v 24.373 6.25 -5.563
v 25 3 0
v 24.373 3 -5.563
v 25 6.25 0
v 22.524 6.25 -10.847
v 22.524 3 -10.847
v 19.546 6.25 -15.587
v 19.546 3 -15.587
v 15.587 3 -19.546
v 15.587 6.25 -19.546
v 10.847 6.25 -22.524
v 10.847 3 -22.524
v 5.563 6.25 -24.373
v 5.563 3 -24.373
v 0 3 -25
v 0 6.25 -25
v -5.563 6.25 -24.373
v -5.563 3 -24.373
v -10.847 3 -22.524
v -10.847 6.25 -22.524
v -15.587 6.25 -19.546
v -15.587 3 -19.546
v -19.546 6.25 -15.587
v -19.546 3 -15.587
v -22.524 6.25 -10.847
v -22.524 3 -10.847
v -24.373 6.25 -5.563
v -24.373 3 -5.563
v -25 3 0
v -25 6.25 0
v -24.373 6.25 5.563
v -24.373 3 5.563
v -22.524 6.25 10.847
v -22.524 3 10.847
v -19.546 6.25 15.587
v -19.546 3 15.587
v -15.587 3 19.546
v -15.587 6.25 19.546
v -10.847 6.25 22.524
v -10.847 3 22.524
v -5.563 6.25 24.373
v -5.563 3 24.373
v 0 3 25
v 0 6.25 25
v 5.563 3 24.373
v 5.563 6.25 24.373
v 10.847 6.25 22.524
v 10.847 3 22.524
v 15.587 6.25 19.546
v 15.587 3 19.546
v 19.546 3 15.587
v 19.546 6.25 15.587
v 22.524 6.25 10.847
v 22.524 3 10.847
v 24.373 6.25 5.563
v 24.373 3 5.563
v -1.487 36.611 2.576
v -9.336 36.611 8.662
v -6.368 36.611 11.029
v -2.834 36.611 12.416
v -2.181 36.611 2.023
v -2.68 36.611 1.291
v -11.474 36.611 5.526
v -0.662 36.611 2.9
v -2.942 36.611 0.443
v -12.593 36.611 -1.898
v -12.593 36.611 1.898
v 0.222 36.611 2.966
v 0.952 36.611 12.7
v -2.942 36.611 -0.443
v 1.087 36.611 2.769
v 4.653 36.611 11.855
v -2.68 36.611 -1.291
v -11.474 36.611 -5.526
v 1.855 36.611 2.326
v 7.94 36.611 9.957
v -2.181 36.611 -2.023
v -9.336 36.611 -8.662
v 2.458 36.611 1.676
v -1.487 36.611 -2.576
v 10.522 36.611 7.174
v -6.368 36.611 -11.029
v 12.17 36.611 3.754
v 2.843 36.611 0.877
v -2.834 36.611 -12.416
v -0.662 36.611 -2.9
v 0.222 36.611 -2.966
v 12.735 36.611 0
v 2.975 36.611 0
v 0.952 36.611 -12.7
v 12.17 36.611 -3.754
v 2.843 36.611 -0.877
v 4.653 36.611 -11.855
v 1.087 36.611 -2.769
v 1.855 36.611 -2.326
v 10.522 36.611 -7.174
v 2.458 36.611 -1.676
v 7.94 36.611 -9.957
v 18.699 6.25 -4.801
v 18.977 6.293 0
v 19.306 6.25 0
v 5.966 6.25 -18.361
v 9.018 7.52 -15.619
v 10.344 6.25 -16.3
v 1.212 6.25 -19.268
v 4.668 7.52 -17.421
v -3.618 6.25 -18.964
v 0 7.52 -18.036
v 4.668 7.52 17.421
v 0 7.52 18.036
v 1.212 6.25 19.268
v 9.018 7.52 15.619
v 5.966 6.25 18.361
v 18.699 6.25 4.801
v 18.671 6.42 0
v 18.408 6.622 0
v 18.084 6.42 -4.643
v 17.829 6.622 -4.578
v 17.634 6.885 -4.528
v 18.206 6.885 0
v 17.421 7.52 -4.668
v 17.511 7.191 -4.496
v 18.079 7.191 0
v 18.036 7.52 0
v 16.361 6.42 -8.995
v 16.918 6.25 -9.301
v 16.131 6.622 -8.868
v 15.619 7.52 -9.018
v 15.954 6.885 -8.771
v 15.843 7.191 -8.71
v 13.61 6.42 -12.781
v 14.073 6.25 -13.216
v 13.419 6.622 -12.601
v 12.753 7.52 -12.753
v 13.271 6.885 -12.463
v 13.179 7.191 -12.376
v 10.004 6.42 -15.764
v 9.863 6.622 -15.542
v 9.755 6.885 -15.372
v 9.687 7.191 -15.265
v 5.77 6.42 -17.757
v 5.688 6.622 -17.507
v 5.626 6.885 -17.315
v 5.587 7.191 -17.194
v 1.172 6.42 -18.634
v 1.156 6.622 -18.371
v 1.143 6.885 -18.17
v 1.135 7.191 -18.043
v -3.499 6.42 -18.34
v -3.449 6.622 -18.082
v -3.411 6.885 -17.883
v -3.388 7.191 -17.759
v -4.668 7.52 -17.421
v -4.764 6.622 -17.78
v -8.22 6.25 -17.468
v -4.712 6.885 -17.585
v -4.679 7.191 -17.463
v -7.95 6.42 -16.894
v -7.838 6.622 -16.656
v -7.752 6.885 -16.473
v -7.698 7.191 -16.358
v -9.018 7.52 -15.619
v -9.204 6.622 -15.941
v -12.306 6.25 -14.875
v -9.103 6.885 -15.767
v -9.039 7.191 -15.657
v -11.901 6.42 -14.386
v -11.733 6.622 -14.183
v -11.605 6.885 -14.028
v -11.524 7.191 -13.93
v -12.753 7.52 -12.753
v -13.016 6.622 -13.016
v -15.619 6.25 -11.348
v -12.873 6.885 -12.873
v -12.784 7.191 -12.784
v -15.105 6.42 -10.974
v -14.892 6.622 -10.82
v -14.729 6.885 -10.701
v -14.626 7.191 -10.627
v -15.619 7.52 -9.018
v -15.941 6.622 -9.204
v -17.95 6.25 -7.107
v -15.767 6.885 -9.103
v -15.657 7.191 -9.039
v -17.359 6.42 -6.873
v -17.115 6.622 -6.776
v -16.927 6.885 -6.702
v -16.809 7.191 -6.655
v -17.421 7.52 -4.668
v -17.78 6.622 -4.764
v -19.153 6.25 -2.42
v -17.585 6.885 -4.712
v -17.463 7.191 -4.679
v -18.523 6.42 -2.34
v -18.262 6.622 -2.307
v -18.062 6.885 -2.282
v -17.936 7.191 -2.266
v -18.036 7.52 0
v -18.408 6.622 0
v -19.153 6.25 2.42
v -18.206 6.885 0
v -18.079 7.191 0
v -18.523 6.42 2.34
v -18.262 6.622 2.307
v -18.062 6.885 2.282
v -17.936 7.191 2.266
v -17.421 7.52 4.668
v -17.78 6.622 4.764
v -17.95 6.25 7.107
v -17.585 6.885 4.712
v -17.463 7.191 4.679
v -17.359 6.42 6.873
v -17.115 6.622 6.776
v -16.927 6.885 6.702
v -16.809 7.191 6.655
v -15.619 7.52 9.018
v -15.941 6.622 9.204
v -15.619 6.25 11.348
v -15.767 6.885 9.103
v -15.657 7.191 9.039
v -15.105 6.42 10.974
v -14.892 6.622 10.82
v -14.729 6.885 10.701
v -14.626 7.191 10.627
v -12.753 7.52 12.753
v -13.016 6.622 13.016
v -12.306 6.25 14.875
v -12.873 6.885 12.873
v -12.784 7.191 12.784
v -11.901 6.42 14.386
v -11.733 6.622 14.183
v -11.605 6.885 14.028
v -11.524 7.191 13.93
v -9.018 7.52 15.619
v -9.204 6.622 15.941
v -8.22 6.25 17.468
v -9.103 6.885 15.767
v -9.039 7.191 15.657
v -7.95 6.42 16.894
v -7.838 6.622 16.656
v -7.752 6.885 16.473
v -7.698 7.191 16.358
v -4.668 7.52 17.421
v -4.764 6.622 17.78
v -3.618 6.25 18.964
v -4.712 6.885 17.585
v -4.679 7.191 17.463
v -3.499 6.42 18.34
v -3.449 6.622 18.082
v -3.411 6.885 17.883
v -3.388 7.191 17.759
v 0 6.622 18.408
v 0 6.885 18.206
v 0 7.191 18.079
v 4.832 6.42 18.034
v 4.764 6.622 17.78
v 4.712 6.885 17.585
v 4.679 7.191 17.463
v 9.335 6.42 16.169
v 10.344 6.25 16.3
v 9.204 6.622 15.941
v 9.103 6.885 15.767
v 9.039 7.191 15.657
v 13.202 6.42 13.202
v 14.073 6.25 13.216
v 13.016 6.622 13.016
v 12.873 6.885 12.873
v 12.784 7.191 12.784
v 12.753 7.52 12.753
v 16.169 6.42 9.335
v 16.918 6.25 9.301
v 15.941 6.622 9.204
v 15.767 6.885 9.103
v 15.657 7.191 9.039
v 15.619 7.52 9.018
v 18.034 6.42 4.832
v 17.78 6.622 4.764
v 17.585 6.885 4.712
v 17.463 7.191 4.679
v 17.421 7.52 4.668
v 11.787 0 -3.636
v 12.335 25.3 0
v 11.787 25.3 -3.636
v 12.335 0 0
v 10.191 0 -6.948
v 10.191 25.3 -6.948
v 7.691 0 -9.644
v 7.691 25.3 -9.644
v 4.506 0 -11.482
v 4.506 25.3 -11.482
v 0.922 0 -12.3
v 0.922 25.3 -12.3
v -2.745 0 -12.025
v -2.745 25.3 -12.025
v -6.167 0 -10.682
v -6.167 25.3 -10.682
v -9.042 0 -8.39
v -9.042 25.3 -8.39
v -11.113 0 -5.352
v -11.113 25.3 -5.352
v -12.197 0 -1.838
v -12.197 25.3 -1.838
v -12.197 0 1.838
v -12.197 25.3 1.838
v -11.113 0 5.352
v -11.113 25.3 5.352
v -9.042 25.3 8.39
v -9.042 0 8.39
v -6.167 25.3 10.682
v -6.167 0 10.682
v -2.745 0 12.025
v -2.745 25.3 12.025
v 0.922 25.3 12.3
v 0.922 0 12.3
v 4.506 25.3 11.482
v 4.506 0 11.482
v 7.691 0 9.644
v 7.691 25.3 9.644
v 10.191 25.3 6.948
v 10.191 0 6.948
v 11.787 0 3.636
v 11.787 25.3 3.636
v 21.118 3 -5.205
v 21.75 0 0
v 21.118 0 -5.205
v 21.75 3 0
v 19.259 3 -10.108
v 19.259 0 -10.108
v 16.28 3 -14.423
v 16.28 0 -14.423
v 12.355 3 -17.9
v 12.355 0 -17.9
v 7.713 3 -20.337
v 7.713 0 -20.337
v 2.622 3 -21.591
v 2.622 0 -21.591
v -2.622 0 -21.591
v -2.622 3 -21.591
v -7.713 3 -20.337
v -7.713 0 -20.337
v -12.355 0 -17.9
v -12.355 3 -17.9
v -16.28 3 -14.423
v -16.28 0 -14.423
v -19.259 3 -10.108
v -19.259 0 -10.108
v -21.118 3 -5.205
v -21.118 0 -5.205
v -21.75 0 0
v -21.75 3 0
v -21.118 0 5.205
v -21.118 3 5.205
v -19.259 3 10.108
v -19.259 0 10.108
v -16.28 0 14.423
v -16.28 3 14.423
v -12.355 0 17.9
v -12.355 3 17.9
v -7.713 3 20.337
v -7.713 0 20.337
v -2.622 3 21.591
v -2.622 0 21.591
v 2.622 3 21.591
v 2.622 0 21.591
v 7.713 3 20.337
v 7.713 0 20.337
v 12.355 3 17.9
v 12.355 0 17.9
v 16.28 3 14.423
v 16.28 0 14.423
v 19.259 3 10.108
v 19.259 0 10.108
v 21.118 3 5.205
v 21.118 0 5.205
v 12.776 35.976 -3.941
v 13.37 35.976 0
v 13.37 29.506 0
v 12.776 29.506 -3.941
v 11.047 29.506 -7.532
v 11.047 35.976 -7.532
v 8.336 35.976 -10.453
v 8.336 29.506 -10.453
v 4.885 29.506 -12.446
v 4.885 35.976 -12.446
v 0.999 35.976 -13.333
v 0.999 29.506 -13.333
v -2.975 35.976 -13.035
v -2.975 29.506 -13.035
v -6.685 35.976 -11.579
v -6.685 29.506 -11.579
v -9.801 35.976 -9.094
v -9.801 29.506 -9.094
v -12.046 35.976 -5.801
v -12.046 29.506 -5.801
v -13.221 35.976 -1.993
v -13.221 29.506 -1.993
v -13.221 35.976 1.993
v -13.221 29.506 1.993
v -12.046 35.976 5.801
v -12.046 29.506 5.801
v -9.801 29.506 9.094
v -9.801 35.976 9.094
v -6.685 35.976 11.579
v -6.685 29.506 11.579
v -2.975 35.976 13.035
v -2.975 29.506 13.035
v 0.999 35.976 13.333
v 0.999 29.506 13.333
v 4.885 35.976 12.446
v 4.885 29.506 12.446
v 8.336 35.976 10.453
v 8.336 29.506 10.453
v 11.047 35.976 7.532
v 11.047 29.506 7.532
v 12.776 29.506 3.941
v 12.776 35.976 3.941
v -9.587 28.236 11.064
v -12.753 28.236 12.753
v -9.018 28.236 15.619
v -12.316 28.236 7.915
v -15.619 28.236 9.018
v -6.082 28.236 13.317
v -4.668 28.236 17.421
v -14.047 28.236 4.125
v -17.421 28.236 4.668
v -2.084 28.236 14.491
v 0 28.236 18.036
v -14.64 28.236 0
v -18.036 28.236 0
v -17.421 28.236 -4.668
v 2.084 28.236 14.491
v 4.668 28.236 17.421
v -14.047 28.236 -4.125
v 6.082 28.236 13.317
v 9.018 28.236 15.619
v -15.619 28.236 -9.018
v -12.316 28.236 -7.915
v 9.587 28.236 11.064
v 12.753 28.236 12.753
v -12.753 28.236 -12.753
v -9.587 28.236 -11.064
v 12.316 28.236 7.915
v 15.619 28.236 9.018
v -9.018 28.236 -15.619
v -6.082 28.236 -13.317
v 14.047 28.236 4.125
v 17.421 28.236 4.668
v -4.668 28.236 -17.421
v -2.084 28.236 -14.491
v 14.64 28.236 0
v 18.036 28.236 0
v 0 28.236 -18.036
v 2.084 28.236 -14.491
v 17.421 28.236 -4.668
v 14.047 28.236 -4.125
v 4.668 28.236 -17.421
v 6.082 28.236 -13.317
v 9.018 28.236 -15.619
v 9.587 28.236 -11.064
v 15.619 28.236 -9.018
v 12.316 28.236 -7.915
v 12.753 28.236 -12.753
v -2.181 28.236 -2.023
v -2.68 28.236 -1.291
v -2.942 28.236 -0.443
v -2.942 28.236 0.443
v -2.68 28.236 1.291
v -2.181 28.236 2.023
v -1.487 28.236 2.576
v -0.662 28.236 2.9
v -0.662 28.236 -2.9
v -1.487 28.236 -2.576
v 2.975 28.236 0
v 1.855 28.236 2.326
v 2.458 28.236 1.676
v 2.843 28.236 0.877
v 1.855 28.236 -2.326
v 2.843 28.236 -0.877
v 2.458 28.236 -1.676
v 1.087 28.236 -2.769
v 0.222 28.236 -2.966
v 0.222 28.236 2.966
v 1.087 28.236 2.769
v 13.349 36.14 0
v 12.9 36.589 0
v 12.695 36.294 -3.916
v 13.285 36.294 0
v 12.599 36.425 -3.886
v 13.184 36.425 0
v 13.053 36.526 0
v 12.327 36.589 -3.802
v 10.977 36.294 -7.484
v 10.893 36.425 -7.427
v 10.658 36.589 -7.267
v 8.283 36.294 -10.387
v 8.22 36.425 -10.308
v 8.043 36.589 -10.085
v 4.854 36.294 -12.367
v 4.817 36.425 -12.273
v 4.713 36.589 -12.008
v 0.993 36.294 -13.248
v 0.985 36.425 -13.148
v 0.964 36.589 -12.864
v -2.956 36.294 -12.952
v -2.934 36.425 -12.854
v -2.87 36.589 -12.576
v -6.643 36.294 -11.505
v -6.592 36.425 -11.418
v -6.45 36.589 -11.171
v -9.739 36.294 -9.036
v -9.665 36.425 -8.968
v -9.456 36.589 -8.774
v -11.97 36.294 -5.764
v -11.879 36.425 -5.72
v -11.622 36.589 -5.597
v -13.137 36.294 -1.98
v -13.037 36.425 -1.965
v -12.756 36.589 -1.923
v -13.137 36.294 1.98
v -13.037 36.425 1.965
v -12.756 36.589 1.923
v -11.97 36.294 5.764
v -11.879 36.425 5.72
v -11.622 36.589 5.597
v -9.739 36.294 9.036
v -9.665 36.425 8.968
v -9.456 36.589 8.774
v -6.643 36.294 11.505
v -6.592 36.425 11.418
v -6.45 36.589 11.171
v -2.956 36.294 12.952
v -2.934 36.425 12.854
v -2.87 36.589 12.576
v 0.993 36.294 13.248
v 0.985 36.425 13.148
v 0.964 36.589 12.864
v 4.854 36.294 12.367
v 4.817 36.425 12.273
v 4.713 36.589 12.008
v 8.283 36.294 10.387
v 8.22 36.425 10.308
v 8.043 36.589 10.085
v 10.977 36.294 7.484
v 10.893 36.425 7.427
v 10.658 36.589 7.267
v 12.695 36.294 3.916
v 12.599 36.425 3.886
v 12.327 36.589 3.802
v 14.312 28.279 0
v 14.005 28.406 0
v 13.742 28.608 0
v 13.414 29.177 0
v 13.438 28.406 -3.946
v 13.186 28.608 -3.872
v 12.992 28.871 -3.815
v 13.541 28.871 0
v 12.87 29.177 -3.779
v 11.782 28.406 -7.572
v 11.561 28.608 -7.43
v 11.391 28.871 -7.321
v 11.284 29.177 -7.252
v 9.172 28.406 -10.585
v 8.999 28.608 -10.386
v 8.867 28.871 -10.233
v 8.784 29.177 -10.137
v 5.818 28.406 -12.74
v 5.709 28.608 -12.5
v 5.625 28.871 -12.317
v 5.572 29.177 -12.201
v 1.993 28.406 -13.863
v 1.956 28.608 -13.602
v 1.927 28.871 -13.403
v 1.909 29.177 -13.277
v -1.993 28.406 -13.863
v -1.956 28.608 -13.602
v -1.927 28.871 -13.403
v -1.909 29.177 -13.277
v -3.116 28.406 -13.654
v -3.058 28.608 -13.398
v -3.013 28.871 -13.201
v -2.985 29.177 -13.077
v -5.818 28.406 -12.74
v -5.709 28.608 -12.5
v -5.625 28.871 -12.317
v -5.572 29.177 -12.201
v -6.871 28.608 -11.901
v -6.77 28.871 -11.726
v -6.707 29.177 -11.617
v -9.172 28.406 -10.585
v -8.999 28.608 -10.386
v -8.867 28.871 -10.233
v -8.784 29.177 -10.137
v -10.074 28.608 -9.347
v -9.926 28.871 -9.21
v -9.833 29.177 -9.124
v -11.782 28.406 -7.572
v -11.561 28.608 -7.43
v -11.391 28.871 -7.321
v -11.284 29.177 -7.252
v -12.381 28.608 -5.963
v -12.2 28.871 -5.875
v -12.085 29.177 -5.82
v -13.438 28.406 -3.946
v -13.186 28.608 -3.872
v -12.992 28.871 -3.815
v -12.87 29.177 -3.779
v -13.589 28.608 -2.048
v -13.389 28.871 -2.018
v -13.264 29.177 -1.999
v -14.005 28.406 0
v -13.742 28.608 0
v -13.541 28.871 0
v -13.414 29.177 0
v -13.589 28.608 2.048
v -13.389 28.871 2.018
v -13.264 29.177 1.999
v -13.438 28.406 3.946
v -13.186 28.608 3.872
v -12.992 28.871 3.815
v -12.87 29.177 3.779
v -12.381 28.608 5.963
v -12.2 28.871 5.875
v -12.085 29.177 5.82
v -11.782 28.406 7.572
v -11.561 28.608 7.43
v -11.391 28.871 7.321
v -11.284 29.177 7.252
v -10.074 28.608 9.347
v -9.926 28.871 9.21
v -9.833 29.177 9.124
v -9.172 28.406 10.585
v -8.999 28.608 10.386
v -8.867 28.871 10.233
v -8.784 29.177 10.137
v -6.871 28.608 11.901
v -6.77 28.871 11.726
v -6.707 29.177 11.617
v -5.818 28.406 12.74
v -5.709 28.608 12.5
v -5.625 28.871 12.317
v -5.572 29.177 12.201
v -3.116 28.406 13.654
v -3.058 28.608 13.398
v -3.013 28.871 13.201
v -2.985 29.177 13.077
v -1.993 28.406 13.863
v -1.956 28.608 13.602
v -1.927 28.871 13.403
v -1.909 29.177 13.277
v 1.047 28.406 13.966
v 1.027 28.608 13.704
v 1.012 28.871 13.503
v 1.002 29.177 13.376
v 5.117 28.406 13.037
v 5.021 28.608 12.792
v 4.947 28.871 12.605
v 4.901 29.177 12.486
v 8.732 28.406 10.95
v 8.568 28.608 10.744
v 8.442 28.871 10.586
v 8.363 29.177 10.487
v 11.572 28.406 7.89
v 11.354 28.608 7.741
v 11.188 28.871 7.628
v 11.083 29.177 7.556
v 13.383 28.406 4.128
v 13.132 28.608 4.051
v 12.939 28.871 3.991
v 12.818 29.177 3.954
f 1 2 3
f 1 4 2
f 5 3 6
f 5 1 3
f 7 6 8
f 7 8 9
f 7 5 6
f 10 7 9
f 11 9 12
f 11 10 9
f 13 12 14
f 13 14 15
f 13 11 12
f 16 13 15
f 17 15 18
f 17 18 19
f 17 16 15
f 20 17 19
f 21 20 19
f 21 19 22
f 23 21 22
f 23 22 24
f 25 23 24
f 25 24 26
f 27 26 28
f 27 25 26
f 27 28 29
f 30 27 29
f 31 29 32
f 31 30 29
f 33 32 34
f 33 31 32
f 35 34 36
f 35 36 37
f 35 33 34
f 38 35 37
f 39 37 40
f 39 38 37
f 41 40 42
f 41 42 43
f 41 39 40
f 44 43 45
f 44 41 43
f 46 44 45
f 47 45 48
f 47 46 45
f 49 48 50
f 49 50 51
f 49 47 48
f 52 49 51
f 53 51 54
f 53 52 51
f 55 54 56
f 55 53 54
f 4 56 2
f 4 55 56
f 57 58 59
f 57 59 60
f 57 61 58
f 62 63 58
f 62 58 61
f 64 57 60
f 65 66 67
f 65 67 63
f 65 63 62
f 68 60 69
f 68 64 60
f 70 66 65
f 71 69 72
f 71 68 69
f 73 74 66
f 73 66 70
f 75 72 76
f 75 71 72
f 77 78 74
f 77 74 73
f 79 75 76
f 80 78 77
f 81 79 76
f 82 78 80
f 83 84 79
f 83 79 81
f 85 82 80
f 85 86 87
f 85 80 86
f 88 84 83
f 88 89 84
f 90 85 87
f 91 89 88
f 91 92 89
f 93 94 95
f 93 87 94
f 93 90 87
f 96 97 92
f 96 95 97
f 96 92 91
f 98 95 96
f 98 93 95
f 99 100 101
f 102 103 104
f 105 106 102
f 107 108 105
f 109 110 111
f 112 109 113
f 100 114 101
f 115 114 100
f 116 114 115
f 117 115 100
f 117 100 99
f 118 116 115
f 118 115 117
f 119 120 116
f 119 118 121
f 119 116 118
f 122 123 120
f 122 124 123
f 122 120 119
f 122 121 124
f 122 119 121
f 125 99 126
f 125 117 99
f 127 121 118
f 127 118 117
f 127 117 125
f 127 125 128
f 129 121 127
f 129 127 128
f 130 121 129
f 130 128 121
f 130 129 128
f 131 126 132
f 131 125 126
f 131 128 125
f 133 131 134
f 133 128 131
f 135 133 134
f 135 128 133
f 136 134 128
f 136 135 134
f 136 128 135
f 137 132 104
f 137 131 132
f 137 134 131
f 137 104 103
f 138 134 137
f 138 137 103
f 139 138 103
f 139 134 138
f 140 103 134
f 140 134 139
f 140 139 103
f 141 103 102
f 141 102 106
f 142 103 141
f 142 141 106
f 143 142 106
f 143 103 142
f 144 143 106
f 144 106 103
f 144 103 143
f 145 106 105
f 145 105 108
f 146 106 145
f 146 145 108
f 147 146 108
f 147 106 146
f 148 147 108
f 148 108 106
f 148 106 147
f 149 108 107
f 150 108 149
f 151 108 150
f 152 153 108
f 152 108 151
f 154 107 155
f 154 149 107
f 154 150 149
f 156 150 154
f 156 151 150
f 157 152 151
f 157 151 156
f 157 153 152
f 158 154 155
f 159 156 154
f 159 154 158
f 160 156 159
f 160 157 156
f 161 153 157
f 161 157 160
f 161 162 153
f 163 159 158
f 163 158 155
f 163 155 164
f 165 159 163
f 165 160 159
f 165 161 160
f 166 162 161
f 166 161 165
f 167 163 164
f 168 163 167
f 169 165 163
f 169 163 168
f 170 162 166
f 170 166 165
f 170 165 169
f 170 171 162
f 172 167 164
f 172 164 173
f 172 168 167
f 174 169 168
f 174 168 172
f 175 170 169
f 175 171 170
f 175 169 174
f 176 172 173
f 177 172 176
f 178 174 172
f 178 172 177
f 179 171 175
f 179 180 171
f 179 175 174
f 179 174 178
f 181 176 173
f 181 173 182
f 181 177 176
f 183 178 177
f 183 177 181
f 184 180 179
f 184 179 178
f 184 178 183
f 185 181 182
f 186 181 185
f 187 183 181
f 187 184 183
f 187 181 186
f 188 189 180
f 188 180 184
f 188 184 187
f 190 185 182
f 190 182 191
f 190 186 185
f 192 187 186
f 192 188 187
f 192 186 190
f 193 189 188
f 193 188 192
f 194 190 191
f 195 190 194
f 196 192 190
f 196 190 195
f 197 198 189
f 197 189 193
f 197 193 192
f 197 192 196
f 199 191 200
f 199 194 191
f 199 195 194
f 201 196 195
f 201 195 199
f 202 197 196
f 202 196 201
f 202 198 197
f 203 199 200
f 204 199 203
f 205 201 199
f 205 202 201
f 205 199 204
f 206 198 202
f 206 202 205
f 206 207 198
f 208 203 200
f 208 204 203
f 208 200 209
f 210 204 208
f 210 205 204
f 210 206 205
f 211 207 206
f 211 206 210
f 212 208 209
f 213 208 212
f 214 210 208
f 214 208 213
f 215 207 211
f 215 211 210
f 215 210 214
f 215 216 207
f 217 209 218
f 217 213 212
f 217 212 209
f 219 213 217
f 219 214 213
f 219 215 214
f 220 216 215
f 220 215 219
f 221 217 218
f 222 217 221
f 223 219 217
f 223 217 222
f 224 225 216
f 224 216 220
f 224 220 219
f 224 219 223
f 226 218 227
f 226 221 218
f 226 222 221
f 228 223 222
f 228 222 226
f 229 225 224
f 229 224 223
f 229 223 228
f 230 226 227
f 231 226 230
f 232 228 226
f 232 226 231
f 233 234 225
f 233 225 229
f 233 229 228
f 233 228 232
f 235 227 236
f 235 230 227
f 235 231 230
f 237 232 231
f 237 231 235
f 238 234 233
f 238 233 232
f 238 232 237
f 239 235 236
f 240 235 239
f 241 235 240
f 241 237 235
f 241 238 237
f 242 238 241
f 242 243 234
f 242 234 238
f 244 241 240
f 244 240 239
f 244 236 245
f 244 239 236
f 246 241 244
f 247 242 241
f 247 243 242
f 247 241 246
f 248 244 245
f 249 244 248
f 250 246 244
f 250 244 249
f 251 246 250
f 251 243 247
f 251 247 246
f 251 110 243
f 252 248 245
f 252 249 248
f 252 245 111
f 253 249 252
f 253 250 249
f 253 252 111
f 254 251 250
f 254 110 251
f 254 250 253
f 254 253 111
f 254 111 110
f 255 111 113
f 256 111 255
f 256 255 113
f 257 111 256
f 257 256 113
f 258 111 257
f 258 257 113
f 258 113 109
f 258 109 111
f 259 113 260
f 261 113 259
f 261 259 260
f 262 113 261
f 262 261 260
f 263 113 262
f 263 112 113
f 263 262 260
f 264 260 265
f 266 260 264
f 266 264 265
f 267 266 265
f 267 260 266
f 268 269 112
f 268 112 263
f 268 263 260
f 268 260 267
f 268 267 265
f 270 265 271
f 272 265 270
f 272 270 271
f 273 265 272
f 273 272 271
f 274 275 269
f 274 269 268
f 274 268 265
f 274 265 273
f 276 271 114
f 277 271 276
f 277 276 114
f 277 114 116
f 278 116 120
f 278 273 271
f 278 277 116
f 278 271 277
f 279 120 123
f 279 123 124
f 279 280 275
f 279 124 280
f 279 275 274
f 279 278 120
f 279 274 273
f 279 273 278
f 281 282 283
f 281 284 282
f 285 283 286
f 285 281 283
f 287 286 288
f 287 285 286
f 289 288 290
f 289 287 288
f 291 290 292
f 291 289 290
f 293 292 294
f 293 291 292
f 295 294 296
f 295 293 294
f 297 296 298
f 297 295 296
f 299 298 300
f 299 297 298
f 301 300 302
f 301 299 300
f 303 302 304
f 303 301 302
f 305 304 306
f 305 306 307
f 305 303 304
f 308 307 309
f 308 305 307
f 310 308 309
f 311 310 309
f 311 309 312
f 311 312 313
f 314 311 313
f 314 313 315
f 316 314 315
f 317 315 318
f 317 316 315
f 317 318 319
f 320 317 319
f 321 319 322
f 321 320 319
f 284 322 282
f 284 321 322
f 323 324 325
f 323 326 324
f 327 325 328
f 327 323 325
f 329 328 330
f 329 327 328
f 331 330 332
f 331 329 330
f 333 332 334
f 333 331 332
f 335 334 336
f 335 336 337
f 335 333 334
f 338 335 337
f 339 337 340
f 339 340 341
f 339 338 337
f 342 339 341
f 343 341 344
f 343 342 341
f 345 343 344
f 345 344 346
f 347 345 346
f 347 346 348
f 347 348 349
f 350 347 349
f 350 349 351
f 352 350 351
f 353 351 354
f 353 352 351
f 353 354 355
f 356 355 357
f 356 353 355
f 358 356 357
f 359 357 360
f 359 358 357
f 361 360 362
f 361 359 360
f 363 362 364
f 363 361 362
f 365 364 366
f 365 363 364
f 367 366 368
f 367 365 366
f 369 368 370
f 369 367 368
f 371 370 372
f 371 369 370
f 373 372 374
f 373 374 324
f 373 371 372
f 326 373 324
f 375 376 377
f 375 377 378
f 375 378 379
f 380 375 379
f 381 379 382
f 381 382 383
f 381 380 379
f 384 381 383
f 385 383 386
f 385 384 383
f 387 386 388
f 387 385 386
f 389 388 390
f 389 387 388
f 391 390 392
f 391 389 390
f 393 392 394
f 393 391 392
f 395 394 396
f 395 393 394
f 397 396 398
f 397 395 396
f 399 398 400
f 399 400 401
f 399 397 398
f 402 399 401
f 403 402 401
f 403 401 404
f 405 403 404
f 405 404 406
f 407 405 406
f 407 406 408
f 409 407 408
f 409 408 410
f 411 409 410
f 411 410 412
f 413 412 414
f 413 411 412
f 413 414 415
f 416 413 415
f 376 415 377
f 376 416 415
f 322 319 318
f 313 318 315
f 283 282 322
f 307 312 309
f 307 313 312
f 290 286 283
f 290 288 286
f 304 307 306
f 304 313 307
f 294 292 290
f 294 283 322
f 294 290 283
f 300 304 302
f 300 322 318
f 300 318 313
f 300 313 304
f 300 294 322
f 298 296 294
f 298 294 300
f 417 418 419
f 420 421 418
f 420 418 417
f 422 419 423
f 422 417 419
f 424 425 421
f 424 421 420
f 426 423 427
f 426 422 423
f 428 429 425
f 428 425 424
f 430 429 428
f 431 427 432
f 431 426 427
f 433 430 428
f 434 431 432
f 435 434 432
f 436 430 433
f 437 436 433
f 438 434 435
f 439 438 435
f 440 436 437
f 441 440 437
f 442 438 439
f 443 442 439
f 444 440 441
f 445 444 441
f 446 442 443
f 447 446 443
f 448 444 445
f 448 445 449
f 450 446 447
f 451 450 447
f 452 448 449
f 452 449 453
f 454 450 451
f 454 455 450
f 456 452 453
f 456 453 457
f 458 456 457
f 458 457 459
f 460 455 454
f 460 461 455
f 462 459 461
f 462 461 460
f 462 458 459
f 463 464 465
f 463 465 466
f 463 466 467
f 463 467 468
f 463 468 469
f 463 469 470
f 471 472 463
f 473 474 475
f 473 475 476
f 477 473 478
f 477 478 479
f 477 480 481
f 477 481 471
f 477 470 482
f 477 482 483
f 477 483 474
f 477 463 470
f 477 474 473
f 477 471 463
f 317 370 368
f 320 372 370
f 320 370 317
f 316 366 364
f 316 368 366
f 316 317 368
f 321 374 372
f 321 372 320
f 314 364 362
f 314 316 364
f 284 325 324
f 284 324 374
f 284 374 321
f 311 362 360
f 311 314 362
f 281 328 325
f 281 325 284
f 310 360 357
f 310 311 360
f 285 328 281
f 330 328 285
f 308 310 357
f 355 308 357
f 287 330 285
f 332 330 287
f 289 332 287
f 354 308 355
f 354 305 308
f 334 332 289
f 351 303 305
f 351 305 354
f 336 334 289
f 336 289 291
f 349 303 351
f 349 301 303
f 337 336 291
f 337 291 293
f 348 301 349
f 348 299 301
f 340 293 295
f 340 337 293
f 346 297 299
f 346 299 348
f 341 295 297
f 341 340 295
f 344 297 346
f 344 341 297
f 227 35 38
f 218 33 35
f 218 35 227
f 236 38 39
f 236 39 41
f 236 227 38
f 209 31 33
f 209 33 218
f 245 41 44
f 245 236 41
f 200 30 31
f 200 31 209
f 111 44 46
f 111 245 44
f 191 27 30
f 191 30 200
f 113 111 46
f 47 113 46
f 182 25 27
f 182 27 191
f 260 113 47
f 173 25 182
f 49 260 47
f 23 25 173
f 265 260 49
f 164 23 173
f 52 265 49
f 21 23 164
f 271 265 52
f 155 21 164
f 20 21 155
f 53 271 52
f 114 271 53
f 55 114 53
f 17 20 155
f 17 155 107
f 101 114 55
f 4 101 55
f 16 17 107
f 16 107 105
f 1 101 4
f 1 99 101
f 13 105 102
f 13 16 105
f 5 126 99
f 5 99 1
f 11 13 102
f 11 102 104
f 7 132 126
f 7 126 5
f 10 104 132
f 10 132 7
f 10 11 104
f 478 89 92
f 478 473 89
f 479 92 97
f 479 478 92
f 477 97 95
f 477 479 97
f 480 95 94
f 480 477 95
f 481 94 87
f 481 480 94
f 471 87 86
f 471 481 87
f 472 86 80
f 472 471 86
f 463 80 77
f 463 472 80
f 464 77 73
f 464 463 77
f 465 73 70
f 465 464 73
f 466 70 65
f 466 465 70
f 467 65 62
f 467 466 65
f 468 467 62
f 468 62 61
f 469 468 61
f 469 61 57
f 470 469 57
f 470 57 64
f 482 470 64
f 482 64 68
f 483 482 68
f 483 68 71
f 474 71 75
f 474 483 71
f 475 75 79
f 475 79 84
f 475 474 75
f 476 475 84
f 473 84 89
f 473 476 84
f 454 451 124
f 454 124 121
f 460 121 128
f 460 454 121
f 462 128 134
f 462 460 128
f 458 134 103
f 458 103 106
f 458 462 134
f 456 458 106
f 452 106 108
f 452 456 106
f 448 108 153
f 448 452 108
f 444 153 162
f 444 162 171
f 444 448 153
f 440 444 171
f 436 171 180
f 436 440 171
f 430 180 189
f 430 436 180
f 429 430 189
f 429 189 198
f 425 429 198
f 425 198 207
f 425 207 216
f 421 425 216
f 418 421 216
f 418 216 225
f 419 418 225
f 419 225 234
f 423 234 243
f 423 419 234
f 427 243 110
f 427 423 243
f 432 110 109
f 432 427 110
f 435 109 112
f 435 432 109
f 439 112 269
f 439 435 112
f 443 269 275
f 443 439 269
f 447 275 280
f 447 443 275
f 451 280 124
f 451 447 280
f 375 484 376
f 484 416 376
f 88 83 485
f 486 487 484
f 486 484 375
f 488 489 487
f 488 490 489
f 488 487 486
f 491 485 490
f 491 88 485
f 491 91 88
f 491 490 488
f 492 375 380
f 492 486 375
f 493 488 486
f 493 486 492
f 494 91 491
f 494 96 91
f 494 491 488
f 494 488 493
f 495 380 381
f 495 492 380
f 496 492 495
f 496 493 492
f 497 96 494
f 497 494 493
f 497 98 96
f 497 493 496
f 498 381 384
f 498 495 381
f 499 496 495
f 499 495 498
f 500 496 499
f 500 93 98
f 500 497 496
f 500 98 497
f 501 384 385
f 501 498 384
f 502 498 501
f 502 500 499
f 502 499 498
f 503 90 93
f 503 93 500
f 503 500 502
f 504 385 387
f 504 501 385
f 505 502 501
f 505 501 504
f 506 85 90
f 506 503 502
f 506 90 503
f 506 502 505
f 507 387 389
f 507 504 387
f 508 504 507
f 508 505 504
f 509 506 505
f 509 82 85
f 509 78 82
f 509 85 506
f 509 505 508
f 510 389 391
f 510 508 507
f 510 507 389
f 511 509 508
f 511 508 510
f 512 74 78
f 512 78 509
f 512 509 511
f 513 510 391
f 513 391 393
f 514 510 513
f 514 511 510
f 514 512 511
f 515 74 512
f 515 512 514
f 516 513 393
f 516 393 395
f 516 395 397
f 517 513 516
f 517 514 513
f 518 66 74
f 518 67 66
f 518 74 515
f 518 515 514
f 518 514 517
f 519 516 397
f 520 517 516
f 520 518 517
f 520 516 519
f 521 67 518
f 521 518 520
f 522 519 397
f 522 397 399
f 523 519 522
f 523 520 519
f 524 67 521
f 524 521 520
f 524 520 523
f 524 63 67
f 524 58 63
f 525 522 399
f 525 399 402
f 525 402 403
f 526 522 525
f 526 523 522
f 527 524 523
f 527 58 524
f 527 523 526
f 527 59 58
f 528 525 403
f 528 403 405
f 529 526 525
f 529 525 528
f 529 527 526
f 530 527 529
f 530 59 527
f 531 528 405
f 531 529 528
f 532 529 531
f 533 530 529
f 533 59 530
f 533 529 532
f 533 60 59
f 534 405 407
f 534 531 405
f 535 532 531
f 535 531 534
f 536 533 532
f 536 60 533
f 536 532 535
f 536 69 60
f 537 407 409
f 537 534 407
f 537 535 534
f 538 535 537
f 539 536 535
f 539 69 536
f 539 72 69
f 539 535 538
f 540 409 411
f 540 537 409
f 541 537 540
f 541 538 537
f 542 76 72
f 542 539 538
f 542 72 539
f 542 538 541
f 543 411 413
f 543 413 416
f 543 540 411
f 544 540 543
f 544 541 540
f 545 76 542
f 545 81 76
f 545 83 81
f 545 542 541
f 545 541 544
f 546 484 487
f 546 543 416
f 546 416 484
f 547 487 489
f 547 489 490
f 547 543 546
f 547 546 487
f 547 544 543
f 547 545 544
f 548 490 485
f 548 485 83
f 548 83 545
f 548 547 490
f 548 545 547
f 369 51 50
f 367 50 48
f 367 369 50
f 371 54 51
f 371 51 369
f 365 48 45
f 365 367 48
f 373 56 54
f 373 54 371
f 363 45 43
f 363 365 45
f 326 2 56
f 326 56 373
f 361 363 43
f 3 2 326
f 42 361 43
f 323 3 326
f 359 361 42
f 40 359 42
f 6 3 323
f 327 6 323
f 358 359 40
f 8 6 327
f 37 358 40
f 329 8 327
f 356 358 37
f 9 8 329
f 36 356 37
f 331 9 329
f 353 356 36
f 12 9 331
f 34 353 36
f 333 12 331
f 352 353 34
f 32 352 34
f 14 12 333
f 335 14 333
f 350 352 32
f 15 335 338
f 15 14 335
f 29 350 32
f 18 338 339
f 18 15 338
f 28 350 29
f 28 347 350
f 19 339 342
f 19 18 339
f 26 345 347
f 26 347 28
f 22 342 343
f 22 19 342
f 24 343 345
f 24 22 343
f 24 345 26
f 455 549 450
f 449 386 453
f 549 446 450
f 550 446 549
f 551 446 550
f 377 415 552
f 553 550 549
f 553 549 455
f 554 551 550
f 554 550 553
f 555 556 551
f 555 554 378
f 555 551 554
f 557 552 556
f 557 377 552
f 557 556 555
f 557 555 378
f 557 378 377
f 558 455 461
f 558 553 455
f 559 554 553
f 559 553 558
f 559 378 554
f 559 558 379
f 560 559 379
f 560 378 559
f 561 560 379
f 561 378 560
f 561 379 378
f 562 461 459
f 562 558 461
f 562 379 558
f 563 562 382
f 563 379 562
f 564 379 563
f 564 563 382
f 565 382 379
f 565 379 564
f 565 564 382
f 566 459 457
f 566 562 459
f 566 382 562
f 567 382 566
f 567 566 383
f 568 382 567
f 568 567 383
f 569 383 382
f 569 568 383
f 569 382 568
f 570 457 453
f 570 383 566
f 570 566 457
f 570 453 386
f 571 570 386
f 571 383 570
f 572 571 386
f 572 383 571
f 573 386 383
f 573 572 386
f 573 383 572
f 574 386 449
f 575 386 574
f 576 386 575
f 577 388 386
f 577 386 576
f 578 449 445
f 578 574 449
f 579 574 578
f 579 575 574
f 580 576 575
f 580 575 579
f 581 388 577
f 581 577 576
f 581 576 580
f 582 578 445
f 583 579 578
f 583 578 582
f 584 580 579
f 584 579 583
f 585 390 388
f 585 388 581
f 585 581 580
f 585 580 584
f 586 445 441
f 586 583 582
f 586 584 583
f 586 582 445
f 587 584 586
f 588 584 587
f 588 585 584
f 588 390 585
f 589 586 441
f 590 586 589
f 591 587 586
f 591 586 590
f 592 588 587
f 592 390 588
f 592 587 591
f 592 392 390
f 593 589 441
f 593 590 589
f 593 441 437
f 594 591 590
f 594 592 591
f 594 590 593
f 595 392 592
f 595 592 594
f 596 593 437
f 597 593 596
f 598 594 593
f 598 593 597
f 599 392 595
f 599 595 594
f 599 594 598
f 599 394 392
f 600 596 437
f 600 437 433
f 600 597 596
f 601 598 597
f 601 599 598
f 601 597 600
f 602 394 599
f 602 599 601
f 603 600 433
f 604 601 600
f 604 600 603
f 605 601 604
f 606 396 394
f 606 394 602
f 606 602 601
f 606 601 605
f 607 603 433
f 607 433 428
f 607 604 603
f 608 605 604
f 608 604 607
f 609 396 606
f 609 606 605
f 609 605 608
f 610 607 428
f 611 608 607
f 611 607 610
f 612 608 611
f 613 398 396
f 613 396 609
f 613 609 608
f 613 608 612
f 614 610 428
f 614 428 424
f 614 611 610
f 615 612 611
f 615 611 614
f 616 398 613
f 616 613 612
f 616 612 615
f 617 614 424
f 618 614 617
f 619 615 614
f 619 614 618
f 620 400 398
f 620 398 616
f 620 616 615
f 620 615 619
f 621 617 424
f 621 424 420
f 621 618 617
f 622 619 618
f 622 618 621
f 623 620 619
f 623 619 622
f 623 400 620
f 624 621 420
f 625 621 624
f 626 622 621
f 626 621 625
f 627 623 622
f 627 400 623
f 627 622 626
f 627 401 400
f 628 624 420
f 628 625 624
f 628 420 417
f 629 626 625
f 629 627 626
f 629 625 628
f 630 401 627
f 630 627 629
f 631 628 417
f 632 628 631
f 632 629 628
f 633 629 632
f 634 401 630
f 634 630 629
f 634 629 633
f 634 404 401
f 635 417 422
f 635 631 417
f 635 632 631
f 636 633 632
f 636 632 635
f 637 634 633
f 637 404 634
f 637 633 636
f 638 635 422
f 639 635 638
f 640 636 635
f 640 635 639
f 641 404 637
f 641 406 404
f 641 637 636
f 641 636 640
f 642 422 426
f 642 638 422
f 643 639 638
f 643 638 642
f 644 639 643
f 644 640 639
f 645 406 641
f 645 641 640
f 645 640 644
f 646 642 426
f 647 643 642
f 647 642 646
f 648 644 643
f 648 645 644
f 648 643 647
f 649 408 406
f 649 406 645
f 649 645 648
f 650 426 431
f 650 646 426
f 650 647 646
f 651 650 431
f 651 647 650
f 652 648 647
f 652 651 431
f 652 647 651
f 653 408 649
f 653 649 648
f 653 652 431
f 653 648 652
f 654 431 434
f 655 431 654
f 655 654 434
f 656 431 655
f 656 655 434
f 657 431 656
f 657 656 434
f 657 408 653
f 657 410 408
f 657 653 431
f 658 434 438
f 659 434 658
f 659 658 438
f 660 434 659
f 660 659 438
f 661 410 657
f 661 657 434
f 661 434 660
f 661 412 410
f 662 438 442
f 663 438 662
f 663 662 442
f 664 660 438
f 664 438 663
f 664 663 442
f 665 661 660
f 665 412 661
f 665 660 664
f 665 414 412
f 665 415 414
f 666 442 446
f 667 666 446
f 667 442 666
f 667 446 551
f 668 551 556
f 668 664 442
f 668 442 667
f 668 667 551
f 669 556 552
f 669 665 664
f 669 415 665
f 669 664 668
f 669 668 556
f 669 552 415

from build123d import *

# Parameters (mm, degrees)
FILLET2_R = 1.27
FILLET3_R = 0.635


with BuildPart() as part:
    # Sketch1 → Revolve4 (revolve)
    with BuildSketch(Plane.XY):
        Polygon((12.334639896, 0), (21.75, 0), (21.75, 3), (25, 3), (25, 6.25), (18.035610483, 6.25), (18.035610483, 28.23587128), (13.370385965, 28.23587128), (13.370385965, 36.611095198), (2.974741934, 36.611095198), (2.974741934, 28.23587128), (0, 28.23587128), (0, 25.3), (2.830568931, 25.3), (2.974741934, 25.3), (12.334639896, 25.3), align=None)
    revolve(axis=Axis((0, 0, 0), (0, 1, 0)))

    # Fillet2
    fillet2_edges = [part.edges().sort_by_distance(p)[0] for p in [
        (-13.370385965, 28.23587128, 0),
        (-18.035610483, 6.25, 0),
    ]]
    fillet(fillet2_edges, radius=FILLET2_R)

    # Fillet3
    fillet3_edges = [part.edges().sort_by_distance(p)[0] for p in [
        (-13.370385965, 36.611095198, 0),
    ]]
    fillet(fillet3_edges, radius=FILLET3_R)


solid = part.part
